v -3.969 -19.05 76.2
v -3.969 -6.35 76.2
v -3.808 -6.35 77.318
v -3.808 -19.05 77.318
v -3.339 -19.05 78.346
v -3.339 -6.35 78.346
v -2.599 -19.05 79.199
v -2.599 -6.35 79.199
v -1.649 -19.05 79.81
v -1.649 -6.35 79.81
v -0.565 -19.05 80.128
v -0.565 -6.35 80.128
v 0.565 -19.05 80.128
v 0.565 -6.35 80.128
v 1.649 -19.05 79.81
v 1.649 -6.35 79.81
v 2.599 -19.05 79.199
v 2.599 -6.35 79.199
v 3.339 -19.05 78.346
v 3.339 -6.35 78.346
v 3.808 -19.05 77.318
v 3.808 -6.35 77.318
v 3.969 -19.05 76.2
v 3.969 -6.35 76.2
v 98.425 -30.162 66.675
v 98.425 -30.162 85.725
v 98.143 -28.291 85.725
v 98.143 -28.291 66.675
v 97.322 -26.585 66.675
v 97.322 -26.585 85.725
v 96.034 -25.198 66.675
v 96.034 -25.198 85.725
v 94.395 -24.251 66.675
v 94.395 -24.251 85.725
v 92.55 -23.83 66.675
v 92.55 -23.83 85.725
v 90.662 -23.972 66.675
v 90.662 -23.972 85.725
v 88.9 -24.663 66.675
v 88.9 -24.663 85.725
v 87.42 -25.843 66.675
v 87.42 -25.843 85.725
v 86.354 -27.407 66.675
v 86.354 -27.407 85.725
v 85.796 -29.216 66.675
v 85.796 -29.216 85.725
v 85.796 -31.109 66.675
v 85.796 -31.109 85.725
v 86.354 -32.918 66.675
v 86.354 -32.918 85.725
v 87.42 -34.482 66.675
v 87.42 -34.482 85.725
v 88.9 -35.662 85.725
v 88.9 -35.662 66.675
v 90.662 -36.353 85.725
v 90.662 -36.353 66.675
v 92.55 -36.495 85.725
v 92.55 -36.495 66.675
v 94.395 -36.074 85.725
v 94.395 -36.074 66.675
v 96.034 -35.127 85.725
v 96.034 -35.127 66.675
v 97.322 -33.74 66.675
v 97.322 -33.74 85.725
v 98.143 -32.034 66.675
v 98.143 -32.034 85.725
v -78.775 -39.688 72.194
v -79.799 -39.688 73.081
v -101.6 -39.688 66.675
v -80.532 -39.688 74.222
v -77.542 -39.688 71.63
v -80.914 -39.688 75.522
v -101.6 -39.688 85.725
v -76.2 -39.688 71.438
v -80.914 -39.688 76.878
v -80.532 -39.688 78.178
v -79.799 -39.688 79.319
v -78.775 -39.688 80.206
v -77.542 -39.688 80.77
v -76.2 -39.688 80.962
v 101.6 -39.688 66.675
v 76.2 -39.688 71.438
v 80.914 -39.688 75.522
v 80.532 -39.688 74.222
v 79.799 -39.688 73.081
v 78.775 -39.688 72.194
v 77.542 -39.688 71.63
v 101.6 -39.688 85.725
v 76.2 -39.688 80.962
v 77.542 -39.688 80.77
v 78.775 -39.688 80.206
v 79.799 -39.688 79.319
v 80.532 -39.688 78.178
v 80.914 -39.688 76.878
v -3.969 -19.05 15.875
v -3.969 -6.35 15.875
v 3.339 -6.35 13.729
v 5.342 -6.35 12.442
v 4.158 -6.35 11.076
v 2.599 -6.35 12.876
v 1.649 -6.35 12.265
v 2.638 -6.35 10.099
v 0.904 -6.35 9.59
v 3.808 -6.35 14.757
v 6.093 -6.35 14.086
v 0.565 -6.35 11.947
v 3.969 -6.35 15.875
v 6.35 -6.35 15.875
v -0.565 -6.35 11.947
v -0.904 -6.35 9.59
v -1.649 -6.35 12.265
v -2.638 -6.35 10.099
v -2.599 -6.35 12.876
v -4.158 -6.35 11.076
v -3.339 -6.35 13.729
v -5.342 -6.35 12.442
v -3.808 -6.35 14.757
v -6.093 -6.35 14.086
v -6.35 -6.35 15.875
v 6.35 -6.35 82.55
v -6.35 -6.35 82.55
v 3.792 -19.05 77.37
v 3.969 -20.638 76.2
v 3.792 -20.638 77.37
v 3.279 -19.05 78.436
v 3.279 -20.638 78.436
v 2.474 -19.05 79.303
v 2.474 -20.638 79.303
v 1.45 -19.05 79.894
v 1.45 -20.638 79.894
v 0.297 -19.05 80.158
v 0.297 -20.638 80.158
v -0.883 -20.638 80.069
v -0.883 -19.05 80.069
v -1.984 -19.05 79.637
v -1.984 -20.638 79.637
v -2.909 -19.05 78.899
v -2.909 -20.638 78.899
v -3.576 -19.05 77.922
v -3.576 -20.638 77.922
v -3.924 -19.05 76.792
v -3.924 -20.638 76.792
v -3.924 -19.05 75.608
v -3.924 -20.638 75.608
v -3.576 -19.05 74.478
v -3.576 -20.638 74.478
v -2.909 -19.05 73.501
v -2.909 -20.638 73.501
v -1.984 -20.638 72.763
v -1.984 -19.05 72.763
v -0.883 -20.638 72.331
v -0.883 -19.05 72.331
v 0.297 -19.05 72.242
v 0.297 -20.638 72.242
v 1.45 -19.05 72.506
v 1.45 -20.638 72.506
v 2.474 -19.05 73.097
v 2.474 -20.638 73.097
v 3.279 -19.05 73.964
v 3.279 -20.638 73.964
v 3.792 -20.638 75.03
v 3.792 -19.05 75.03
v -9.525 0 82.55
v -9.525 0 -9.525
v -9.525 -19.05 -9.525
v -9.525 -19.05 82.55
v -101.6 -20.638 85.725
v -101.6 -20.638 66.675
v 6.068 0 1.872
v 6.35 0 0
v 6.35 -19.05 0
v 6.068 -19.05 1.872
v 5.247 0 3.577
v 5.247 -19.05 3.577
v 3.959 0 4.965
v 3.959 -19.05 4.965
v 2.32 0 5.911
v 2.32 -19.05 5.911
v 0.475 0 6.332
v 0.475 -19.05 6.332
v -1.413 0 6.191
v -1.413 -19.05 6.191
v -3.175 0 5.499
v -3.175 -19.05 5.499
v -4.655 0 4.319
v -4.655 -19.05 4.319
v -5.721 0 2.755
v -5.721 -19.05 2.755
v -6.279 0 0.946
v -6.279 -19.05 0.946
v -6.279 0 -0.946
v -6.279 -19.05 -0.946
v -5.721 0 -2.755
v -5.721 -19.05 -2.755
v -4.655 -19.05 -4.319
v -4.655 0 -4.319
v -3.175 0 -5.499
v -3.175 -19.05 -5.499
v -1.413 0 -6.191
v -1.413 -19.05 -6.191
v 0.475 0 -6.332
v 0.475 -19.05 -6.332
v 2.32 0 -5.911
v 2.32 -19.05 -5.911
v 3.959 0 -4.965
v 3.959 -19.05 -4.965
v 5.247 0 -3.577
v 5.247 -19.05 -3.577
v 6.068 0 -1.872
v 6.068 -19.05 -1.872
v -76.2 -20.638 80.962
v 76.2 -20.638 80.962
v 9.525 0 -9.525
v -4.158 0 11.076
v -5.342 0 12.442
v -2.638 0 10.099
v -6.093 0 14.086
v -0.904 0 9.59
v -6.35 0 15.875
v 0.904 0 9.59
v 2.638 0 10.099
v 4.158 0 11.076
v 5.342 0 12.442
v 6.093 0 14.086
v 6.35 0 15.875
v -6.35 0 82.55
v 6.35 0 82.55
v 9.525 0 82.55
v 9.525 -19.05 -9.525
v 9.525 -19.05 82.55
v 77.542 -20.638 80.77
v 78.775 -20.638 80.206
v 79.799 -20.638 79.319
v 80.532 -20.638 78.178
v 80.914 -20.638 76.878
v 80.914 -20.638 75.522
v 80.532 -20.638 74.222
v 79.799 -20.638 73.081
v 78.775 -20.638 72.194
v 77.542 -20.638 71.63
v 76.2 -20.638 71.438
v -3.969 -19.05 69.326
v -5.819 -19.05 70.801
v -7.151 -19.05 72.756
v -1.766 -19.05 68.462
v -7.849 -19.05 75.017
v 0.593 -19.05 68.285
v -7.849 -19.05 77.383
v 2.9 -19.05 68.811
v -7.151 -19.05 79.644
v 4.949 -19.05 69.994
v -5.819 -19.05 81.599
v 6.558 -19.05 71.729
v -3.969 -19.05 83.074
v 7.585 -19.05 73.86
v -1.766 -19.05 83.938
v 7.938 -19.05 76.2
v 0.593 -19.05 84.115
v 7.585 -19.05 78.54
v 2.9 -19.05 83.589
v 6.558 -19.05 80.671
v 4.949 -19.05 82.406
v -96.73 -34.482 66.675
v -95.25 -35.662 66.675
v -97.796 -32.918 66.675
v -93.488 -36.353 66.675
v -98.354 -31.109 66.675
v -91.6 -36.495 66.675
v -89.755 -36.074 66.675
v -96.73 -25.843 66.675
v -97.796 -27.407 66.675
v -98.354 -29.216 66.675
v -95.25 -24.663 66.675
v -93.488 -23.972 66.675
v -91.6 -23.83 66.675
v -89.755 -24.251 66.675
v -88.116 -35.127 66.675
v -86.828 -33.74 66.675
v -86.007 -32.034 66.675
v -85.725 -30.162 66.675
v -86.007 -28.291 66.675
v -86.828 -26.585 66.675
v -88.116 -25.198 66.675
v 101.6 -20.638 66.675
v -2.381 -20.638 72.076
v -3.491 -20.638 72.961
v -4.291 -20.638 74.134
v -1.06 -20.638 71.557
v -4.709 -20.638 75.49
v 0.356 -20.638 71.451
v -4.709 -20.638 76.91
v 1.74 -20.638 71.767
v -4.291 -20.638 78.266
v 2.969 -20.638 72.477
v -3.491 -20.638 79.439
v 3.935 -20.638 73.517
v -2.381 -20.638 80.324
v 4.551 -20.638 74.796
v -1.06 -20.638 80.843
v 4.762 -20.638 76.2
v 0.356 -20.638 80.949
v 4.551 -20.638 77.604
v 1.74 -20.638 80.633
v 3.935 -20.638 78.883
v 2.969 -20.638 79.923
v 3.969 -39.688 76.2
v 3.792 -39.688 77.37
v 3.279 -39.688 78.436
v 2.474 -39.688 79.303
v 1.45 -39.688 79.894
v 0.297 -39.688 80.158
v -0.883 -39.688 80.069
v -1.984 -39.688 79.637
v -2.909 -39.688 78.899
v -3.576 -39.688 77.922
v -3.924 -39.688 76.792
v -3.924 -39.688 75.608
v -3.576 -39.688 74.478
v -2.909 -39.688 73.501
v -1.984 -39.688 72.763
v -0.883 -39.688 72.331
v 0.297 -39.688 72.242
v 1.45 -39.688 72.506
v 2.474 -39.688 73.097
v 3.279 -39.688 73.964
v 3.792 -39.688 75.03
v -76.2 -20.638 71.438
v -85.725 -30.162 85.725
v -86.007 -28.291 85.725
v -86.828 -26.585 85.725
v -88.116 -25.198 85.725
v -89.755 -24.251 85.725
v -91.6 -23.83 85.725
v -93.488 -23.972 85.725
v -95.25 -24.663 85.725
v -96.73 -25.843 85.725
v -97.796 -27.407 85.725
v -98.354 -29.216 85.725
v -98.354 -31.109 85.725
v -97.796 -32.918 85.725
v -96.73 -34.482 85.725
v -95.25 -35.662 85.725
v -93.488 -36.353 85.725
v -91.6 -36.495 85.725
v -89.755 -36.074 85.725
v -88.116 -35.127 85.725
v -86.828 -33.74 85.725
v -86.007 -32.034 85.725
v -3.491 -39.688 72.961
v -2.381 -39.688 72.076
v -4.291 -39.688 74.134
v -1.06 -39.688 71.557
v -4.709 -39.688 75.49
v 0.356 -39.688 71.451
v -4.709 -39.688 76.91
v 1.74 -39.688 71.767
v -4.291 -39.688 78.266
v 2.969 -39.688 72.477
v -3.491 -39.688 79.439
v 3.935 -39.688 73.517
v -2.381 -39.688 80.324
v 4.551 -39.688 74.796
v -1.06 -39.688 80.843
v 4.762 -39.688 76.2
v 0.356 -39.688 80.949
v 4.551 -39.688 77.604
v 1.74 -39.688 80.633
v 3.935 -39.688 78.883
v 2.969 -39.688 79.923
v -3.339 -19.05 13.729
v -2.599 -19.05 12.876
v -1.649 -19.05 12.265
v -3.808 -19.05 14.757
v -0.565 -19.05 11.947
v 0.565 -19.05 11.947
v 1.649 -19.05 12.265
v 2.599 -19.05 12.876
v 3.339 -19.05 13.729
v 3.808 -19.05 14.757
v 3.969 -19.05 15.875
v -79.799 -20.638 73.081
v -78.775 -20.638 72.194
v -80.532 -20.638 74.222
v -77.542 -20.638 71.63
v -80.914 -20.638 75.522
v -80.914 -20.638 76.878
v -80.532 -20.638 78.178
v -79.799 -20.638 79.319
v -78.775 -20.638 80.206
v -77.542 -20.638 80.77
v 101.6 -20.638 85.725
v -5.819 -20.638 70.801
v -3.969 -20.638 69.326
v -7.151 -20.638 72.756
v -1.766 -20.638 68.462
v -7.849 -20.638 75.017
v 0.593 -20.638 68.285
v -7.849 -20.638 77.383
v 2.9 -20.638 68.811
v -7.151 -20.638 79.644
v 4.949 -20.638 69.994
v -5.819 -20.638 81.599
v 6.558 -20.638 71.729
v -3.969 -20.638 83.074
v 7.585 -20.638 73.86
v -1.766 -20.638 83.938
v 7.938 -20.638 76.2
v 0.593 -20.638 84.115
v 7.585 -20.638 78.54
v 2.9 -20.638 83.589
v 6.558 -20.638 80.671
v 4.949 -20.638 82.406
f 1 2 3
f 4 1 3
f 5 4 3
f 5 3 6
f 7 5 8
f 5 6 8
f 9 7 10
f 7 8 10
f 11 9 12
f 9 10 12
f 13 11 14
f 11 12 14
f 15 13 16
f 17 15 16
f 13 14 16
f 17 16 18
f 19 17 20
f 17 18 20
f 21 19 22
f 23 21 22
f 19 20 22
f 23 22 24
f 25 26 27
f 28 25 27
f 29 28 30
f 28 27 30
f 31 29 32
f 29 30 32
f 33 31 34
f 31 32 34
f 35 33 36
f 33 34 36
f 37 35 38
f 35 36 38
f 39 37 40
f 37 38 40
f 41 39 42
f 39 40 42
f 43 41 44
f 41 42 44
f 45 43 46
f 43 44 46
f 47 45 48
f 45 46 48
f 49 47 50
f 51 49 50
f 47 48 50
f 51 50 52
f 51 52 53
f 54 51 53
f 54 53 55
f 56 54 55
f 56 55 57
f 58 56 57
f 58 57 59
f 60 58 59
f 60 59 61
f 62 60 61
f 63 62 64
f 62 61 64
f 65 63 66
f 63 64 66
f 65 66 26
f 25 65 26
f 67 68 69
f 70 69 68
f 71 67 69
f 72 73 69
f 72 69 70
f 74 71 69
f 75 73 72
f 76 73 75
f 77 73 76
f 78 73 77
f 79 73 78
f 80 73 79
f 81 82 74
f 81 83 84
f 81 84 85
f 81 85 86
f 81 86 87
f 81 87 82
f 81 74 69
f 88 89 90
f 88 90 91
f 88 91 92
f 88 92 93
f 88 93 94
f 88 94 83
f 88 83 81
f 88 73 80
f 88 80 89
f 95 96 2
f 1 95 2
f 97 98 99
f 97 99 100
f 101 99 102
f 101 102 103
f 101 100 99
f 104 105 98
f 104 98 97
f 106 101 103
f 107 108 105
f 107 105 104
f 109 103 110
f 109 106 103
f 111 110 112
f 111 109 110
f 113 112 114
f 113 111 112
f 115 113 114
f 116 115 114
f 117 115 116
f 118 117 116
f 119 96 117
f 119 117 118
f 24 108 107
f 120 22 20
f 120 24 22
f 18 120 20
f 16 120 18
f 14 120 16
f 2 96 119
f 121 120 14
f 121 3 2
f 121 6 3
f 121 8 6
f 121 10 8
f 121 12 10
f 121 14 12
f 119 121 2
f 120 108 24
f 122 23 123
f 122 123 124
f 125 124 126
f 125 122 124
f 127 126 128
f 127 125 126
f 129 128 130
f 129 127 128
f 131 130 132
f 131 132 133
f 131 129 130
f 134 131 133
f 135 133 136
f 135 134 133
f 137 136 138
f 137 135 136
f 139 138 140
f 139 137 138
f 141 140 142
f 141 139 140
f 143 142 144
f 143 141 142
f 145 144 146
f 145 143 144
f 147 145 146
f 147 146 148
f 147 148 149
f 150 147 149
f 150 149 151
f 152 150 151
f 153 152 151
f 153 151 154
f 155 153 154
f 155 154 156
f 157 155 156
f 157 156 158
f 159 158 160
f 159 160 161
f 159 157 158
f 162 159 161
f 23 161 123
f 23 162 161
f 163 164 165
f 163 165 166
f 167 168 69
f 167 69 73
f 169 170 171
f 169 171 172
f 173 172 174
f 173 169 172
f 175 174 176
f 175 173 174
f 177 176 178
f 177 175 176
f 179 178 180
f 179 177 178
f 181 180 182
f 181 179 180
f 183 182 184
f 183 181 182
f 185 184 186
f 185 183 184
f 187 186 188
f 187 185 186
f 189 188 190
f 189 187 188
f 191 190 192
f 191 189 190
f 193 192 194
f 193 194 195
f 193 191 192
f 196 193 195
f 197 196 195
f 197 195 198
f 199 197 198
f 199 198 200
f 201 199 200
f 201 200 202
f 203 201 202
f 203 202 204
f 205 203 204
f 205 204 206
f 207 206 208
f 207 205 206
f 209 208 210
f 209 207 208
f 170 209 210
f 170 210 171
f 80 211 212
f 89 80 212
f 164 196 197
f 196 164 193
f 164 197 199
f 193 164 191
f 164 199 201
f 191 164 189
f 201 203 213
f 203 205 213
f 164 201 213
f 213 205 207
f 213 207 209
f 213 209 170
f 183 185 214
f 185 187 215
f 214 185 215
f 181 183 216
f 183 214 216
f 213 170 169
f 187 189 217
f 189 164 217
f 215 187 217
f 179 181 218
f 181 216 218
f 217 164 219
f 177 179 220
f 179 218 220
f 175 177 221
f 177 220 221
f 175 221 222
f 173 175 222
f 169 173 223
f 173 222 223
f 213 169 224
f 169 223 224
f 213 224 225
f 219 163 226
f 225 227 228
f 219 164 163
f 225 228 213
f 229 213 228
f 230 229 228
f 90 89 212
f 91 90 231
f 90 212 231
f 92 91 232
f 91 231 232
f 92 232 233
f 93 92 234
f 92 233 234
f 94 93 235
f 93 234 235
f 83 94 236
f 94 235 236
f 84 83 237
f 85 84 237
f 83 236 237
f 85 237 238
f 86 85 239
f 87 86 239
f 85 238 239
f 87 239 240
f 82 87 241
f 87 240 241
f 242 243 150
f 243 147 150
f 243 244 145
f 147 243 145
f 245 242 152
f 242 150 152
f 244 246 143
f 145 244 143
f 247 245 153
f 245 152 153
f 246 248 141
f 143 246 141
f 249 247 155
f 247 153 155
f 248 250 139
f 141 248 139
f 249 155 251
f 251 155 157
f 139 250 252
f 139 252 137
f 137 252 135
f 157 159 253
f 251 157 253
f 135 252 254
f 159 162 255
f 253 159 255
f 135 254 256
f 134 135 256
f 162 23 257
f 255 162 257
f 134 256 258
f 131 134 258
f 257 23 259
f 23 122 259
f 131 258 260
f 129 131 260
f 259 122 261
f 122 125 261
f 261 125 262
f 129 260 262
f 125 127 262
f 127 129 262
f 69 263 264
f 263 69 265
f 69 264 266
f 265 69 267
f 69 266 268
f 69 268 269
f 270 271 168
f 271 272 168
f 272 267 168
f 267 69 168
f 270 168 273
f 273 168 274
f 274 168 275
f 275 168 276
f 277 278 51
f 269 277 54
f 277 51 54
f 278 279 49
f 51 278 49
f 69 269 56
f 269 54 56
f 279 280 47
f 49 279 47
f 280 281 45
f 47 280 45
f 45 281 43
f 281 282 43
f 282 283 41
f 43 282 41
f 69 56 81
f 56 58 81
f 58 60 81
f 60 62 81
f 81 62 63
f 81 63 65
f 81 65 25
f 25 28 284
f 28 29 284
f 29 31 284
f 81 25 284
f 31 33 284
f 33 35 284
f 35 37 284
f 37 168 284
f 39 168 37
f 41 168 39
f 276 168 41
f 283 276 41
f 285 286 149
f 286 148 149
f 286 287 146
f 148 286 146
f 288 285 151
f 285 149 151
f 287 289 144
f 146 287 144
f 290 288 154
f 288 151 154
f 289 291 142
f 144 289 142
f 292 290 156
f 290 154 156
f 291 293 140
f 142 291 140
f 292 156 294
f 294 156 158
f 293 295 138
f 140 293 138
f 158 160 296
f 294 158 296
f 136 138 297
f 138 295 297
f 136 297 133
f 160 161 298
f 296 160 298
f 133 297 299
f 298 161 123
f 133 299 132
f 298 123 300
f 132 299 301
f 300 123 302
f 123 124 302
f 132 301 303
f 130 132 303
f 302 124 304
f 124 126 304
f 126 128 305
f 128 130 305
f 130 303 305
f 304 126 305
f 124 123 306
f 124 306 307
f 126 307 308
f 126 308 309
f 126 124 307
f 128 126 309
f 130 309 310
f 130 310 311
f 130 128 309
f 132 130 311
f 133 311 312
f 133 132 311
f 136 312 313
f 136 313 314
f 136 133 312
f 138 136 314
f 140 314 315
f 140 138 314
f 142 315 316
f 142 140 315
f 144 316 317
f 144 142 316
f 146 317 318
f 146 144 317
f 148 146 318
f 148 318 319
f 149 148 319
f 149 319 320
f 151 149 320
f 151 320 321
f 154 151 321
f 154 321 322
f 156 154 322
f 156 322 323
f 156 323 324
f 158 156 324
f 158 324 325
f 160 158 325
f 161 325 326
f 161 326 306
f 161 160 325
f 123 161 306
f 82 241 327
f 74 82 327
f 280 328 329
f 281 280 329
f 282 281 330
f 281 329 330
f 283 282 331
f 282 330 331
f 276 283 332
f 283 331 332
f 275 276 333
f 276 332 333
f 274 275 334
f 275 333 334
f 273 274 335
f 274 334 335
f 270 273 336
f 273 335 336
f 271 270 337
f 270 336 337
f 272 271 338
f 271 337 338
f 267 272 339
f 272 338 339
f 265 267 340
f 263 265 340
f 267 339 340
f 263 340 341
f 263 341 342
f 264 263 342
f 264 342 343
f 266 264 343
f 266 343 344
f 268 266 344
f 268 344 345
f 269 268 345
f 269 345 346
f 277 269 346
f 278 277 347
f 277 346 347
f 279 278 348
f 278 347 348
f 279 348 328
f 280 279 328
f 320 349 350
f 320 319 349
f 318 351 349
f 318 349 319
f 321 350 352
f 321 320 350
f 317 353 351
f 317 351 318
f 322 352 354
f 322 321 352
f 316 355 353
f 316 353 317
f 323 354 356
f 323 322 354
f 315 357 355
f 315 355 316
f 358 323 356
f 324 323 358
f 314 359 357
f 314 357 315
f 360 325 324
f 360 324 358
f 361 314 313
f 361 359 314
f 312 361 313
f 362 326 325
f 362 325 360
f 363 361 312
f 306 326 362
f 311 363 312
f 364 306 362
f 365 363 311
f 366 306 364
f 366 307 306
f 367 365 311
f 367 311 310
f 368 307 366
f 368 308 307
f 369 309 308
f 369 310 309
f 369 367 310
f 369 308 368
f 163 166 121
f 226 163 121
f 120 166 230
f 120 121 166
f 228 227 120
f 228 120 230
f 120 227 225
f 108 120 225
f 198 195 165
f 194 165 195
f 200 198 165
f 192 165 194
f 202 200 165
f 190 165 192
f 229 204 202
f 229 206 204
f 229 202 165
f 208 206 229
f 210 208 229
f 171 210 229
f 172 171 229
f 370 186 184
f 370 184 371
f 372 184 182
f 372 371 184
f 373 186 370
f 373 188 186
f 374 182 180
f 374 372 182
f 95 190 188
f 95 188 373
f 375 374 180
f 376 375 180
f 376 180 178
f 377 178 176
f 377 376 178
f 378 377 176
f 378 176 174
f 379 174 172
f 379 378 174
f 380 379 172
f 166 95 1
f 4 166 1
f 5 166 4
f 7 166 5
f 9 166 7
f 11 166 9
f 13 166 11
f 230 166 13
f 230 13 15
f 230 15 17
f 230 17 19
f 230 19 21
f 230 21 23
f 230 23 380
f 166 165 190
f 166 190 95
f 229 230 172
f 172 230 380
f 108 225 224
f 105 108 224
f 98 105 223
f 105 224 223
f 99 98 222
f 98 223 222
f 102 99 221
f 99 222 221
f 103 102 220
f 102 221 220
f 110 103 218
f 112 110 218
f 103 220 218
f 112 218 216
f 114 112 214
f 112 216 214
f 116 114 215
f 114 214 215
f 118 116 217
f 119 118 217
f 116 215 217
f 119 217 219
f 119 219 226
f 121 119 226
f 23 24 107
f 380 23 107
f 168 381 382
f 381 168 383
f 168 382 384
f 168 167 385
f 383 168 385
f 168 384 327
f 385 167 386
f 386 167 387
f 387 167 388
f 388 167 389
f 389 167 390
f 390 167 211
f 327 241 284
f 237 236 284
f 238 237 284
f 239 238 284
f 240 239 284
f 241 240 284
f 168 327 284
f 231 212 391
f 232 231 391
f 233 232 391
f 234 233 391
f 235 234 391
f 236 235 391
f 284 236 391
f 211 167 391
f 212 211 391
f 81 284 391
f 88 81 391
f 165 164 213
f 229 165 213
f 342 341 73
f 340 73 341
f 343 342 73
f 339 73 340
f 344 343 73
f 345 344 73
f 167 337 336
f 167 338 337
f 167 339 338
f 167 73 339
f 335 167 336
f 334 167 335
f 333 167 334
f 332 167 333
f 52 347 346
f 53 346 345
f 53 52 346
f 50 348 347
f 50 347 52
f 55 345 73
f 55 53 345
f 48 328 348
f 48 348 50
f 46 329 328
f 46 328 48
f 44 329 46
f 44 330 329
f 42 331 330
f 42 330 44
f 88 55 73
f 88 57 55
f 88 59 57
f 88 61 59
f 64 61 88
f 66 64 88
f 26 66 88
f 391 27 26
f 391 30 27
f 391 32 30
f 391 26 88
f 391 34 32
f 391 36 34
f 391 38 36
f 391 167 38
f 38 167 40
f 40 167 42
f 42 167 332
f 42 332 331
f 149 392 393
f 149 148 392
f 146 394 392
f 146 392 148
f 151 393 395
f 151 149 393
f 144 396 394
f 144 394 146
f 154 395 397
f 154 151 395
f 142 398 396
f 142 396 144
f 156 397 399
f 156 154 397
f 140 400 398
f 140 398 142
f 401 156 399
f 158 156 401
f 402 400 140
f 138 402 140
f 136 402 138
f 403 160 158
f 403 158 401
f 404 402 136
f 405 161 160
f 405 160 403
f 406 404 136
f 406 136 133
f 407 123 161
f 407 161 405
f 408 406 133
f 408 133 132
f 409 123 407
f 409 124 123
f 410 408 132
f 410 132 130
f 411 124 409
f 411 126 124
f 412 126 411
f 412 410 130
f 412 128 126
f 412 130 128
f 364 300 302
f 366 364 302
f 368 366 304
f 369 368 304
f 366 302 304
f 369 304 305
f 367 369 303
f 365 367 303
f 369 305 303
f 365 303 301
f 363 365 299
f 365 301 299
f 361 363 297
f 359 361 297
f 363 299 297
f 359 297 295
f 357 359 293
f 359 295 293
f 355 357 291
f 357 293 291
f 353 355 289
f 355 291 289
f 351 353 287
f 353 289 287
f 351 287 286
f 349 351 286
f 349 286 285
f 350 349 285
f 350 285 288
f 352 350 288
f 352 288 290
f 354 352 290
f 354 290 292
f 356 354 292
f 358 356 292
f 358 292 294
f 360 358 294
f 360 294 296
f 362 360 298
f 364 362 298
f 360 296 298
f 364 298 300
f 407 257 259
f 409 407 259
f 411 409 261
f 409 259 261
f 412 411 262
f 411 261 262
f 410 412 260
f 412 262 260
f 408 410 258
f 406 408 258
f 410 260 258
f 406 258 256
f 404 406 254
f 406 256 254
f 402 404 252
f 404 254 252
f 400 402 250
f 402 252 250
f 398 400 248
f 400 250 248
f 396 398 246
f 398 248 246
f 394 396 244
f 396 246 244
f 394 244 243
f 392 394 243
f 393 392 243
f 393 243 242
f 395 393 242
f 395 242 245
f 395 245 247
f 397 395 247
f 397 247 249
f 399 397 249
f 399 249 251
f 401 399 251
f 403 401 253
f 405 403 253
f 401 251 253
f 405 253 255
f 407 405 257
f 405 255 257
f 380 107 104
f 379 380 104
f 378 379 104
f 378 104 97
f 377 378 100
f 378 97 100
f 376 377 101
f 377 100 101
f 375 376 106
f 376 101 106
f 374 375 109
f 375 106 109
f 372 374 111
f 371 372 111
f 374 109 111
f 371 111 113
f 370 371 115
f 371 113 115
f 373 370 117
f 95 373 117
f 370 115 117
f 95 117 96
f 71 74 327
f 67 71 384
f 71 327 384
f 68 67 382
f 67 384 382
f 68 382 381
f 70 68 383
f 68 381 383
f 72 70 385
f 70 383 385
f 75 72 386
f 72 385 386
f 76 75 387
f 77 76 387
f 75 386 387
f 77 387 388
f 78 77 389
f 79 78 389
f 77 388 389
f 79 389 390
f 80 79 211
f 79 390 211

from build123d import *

# Parameters (mm, degrees)
F0_W      = 19.05
F0_H      = 92.075
F0_R      = 6.35
F1_DEPTH  = 19.05
F3_DEPTH  = 6.35
F4_R      = 7.9375
F4_R_2    = 3.96875
F5_DEPTH  = 1.5875
F6_R      = 4.7625
F6_R_2    = 3.96875
F7_DEPTH  = 19.05
F8_W      = 203.2
F8_H      = 19.05
F9_DEPTH  = 19.05
F10_R     = 6.35
F11_DEPTH = 19.05


with BuildPart() as f1:
    # F0 (on Front) → F1 (new body)
    with BuildSketch(Plane.XZ):
        with Locations((0, 36.5125)):
            Rectangle(F0_W, F0_H)
        Circle(F0_R, mode=Mode.SUBTRACT)
        with BuildLine():
            ThreePointArc((-3.96875, 76.2), (0, 80.16875), (3.96875, 76.2))
            Line((3.96875, 76.2), (3.96875, 15.875))
            ThreePointArc((3.96875, 15.875), (0, 11.90625), (-3.96875, 15.875))
            Line((-3.96875, 15.875), (-3.96875, 76.2))
        make_face(mode=Mode.SUBTRACT)
    extrude(amount=F1_DEPTH)

    # F2 (on face) → F3 (cut)
    with BuildSketch(Plane(origin=(0, 0, 0), x_dir=(-1, 0, 0), z_dir=(0, 1, 0))):
        with BuildLine():
            ThreePointArc((-6.35, 15.875), (0, 9.525), (6.35, 15.875))
            Line((6.35, 15.875), (6.35, 82.55))
            Line((6.35, 82.55), (-6.35, 82.55))
            Line((-6.35, 82.55), (-6.35, 15.875))
        make_face()
    extrude(amount=-F3_DEPTH, mode=Mode.SUBTRACT)


with BuildPart() as f5:
    # F4 (on face) → F5 (new body)
    with BuildSketch(Plane.XZ.offset(19.05)):
        with Locations((0, 76.2)):
            Circle(F4_R)
        with Locations((0, 76.2)):
            Circle(F4_R_2, mode=Mode.SUBTRACT)
    extrude(amount=F5_DEPTH)


with BuildPart() as f7:
    # F6 (on face) → F7 (new body)
    with BuildSketch(Plane.XZ.offset(20.6375)):
        with Locations((0, 76.2)):
            Circle(F6_R)
        with Locations((0, 76.2)):
            Circle(F6_R_2, mode=Mode.SUBTRACT)
    extrude(amount=F7_DEPTH)


with BuildPart() as f9:
    # F8 (on face) → F9 (new body)
    with BuildSketch(Plane.XZ.offset(20.6375)):
        with Locations((0, 76.2)):
            Rectangle(F8_W, F8_H)
        with BuildLine():
            ThreePointArc((-76.2, 71.4375), (-80.9625, 76.2), (-76.2, 80.9625))
            Line((-76.2, 80.9625), (76.2, 80.9625))
            ThreePointArc((76.2, 80.9625), (80.9625, 76.2), (76.2, 71.4375))
            Line((76.2, 71.4375), (-76.2, 71.4375))
        make_face(mode=Mode.SUBTRACT)
    extrude(amount=F9_DEPTH)

    # F10 (on face) → F11 (cut, through all)
    with BuildSketch(Plane.XY.offset(85.725)):
        with Locations((-92.075, -30.1625)):
            Circle(F10_R)
        with Locations((92.075, -30.1625)):
            Circle(F10_R)
    extrude(amount=-F11_DEPTH, mode=Mode.SUBTRACT)


solid = Compound([f1.part, f5.part, f7.part, f9.part])
